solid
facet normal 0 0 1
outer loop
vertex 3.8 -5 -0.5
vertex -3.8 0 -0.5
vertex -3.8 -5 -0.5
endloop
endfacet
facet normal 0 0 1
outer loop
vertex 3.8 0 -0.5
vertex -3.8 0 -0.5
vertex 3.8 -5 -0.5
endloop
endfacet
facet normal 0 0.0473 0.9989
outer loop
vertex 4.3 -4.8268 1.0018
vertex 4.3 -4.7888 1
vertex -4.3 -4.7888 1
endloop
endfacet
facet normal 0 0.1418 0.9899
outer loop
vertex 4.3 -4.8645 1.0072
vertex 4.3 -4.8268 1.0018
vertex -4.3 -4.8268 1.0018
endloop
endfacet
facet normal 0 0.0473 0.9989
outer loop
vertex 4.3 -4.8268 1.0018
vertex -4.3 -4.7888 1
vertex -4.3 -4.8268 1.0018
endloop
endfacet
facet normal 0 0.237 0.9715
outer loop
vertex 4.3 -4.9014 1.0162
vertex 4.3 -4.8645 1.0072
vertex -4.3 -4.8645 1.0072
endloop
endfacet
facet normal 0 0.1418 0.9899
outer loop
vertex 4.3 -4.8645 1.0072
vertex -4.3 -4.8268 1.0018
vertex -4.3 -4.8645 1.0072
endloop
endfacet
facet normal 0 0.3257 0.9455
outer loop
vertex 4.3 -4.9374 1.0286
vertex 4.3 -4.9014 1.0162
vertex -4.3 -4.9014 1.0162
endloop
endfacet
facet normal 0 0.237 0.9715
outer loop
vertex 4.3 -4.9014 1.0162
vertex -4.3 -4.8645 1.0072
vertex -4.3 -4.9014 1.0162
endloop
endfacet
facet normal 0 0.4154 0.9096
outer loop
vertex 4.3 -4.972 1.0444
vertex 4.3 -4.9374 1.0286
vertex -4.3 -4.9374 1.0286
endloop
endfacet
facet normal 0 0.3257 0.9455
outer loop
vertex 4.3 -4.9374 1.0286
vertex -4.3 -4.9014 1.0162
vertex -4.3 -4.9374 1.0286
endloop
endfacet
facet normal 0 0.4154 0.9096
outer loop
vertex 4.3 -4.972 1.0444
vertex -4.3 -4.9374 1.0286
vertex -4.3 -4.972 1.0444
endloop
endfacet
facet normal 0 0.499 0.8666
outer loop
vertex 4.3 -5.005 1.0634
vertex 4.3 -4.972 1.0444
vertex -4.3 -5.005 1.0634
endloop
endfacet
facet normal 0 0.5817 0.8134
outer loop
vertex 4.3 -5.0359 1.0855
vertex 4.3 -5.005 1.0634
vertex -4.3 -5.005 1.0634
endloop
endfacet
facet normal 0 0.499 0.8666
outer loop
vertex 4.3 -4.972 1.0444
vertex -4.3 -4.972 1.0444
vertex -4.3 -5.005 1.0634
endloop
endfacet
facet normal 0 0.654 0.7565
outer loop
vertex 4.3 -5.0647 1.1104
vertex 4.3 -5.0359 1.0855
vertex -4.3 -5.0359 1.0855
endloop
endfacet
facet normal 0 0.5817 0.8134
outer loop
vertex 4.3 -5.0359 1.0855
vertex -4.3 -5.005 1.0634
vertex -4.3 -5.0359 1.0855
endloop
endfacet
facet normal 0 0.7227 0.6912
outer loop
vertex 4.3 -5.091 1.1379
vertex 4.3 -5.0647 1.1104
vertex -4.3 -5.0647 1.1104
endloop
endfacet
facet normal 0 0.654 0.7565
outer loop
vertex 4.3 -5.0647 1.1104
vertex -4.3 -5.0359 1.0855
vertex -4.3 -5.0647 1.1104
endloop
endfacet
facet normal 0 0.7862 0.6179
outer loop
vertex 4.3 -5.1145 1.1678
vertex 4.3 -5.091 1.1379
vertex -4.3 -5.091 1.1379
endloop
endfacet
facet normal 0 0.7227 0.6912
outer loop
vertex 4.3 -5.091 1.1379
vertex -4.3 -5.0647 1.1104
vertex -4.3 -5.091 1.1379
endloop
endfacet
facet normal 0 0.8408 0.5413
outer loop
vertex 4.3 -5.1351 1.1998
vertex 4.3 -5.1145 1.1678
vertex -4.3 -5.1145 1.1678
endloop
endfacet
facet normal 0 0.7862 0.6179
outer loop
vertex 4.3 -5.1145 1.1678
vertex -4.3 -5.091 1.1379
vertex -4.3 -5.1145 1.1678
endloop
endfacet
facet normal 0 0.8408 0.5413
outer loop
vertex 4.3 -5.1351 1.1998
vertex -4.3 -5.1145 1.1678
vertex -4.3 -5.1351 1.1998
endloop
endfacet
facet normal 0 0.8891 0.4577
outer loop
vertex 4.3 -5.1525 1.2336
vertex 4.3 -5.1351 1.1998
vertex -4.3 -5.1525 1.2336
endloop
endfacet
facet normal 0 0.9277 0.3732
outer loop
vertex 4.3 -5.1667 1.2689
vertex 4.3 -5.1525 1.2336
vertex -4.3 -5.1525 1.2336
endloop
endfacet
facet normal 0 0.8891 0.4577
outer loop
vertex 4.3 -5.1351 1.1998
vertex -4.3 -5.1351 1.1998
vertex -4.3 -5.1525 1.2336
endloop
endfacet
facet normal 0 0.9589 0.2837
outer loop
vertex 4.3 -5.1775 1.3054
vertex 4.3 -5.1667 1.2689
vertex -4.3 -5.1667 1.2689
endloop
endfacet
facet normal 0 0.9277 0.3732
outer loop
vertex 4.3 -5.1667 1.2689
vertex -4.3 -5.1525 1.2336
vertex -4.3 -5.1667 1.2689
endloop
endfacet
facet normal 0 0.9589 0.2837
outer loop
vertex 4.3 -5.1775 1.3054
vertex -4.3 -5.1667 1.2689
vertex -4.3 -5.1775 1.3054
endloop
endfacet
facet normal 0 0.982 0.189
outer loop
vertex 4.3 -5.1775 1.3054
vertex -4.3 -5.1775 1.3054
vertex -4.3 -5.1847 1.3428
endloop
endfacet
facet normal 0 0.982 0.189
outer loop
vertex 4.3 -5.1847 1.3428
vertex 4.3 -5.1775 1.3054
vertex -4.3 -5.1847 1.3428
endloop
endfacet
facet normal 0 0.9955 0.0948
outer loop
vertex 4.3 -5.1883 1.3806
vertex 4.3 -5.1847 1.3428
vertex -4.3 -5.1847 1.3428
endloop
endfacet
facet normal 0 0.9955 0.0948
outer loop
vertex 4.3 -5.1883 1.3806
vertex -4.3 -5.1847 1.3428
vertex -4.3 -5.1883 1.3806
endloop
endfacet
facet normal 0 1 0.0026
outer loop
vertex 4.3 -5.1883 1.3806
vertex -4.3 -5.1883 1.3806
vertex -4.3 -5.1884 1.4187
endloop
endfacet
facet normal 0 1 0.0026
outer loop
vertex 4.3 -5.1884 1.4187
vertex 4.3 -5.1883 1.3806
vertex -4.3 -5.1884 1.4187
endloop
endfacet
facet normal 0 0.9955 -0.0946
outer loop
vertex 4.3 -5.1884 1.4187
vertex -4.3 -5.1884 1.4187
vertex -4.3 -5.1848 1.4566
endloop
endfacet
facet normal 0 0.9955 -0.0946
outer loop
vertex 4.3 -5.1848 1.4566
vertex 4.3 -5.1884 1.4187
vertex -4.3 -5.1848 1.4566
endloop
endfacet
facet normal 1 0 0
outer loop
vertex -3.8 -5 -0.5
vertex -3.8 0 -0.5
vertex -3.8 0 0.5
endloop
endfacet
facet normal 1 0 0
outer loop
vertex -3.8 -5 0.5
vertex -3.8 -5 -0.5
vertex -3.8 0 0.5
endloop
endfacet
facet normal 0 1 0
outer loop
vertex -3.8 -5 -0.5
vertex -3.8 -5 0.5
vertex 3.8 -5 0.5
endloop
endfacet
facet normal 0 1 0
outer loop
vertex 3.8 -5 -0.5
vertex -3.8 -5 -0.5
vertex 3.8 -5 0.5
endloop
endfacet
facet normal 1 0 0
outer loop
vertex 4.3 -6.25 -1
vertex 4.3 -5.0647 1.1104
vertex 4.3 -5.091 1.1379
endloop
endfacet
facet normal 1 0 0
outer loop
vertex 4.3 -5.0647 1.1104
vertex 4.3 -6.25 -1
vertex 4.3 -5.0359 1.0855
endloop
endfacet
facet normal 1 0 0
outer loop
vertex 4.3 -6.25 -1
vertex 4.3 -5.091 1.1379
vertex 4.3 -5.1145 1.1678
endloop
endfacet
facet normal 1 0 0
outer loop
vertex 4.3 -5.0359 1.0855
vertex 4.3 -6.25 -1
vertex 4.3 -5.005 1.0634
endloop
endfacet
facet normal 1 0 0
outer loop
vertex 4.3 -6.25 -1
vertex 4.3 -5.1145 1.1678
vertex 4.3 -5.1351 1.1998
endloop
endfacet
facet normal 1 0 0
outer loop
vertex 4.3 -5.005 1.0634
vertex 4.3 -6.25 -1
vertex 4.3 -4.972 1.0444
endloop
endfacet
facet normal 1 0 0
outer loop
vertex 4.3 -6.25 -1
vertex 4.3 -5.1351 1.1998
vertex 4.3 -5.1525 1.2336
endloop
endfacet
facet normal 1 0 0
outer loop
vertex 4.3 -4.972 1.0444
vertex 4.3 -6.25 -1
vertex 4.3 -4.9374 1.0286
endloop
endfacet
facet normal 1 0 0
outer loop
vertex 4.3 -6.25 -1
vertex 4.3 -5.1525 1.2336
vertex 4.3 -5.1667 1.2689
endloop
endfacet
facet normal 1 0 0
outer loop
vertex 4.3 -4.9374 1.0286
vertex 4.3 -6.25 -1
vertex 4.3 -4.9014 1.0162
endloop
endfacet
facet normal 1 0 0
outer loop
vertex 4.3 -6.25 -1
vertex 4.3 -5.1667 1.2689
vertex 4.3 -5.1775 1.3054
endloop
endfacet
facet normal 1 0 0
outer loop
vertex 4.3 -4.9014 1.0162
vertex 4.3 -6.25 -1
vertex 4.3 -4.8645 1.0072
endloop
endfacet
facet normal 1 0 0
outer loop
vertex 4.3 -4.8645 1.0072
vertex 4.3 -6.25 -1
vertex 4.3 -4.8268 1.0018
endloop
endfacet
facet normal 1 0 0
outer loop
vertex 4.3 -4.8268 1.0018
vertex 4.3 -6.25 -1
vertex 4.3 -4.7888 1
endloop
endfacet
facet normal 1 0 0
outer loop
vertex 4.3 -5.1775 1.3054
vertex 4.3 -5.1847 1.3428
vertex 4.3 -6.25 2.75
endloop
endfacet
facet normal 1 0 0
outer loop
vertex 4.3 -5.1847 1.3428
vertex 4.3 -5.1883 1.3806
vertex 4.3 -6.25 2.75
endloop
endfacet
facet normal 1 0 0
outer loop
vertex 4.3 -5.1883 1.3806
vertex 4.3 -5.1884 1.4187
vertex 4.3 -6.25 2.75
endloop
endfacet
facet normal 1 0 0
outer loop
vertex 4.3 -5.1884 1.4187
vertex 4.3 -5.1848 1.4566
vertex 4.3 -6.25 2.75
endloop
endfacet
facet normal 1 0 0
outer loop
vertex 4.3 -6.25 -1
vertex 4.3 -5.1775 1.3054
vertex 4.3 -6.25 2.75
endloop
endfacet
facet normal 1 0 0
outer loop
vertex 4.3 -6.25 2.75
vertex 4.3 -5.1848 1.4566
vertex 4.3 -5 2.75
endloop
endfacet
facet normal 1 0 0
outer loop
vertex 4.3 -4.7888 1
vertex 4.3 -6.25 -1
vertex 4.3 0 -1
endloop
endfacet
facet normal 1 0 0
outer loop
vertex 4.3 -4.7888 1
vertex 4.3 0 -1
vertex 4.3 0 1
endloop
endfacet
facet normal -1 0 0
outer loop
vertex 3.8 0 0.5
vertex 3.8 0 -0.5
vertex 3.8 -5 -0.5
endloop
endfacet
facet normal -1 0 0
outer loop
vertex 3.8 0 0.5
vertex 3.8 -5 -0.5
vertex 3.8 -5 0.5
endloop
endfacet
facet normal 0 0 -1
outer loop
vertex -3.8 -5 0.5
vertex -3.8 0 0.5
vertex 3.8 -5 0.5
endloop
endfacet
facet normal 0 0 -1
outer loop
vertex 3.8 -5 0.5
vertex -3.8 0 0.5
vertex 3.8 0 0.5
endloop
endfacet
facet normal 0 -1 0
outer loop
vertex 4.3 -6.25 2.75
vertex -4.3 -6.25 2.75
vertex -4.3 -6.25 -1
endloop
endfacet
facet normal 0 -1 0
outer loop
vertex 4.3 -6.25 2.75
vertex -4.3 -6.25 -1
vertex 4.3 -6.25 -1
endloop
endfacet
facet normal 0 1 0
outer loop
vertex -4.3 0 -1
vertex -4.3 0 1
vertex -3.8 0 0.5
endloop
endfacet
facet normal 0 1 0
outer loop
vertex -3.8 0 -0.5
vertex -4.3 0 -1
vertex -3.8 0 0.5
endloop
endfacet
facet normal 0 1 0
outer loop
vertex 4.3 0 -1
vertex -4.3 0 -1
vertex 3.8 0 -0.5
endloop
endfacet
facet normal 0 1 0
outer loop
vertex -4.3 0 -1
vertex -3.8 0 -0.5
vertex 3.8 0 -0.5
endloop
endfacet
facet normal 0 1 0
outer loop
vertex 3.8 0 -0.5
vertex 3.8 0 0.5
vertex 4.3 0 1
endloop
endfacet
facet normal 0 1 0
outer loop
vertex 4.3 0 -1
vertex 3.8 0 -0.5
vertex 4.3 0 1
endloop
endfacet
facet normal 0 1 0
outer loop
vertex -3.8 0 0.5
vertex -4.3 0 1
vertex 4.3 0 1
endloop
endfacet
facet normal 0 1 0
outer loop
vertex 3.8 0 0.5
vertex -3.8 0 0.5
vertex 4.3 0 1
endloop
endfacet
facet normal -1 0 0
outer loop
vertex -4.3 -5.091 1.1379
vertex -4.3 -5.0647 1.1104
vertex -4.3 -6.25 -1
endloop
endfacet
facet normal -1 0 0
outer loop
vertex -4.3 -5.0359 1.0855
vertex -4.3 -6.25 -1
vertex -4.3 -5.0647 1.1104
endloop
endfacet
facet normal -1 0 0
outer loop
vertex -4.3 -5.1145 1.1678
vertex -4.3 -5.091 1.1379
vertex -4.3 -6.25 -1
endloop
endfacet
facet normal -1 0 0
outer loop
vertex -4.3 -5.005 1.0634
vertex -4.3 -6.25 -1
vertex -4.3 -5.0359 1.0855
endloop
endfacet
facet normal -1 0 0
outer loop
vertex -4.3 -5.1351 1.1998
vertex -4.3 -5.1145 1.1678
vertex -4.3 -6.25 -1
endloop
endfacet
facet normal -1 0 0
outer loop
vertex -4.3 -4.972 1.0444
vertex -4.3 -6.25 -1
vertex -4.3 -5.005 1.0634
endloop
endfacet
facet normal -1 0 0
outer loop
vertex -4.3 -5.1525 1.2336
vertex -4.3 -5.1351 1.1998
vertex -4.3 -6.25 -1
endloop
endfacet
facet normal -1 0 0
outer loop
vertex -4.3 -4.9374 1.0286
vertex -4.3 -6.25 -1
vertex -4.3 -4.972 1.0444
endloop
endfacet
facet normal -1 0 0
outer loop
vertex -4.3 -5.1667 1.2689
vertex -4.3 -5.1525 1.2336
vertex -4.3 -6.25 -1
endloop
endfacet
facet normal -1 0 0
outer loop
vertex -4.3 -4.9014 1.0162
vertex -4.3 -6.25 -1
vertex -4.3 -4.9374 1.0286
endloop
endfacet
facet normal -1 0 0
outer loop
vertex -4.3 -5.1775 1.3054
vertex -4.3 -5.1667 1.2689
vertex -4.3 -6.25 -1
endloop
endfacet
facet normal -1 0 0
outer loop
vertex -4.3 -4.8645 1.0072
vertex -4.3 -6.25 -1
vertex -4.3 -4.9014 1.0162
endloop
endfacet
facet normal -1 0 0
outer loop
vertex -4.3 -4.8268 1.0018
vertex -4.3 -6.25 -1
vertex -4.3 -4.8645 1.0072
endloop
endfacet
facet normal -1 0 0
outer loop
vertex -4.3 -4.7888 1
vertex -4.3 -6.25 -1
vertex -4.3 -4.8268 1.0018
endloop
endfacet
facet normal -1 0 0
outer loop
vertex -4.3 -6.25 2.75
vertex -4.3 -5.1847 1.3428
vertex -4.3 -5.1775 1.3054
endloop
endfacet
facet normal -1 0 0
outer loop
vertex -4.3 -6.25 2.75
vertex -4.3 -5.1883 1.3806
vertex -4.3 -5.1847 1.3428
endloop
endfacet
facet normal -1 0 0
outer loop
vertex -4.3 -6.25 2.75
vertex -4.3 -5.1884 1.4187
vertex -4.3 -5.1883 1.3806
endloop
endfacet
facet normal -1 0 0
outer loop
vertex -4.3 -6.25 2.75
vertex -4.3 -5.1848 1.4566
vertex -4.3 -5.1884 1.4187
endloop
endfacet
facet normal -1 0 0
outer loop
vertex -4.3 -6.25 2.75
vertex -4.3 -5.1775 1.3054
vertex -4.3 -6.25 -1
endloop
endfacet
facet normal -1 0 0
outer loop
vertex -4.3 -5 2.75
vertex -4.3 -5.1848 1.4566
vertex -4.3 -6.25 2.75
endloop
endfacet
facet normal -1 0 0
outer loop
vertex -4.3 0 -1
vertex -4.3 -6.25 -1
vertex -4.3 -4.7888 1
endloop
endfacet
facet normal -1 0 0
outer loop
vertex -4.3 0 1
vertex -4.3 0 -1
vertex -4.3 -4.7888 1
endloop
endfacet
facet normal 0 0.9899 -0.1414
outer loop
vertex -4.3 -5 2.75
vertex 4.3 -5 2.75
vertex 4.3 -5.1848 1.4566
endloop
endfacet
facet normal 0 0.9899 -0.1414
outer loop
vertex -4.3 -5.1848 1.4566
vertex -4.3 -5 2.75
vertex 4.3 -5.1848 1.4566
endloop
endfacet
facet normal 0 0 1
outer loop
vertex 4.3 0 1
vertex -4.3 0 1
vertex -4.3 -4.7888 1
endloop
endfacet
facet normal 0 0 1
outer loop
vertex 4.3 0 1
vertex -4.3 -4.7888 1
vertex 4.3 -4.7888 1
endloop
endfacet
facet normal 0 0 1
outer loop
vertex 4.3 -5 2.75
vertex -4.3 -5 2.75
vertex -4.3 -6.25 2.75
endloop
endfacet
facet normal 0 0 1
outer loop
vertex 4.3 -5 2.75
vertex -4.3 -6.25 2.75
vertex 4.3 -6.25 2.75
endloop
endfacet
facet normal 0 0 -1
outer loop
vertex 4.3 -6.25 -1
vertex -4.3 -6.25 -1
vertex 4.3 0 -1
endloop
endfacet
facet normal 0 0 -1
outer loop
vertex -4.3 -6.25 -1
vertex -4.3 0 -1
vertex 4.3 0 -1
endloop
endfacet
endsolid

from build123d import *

# Parameters (mm, degrees)
F0_W     = 8.6
F0_H     = 2
F0_W_2   = 7.6
F0_H_2   = 1
F1_DEPTH = 5
F2_W     = 8.6
F2_H     = 3.75
F3_DEPTH = 1.25
F5_DEPTH = 8.601
F6_R     = 0.4


with BuildPart() as f1:
    # F0 (on Front) → F1 (new body)
    with BuildSketch(Plane.XZ):
        Rectangle(F0_W, F0_H)
        Rectangle(F0_W_2, F0_H_2, mode=Mode.SUBTRACT)
    extrude(amount=F1_DEPTH)

    # F2 (on face) → F3 (join)
    with BuildSketch(Plane.XZ.offset(5)):
        with Locations((0, 0.875)):
            Rectangle(F2_W, F2_H)
    extrude(amount=F3_DEPTH)

    # F4 (on face) → F5 (cut, through all)
    with BuildSketch(Plane.YZ.offset(4.3)):
        Polygon((-5, 1), (-5, 2.75), (-5.25, 1), align=None)
    extrude(amount=-F5_DEPTH, mode=Mode.SUBTRACT)

    # F6
    f6_edges = [f1.edges().sort_by_distance(p)[0] for p in [
        (0, -5.25, 1),
    ]]
    fillet(f6_edges, radius=F6_R)


solid = f1.part
